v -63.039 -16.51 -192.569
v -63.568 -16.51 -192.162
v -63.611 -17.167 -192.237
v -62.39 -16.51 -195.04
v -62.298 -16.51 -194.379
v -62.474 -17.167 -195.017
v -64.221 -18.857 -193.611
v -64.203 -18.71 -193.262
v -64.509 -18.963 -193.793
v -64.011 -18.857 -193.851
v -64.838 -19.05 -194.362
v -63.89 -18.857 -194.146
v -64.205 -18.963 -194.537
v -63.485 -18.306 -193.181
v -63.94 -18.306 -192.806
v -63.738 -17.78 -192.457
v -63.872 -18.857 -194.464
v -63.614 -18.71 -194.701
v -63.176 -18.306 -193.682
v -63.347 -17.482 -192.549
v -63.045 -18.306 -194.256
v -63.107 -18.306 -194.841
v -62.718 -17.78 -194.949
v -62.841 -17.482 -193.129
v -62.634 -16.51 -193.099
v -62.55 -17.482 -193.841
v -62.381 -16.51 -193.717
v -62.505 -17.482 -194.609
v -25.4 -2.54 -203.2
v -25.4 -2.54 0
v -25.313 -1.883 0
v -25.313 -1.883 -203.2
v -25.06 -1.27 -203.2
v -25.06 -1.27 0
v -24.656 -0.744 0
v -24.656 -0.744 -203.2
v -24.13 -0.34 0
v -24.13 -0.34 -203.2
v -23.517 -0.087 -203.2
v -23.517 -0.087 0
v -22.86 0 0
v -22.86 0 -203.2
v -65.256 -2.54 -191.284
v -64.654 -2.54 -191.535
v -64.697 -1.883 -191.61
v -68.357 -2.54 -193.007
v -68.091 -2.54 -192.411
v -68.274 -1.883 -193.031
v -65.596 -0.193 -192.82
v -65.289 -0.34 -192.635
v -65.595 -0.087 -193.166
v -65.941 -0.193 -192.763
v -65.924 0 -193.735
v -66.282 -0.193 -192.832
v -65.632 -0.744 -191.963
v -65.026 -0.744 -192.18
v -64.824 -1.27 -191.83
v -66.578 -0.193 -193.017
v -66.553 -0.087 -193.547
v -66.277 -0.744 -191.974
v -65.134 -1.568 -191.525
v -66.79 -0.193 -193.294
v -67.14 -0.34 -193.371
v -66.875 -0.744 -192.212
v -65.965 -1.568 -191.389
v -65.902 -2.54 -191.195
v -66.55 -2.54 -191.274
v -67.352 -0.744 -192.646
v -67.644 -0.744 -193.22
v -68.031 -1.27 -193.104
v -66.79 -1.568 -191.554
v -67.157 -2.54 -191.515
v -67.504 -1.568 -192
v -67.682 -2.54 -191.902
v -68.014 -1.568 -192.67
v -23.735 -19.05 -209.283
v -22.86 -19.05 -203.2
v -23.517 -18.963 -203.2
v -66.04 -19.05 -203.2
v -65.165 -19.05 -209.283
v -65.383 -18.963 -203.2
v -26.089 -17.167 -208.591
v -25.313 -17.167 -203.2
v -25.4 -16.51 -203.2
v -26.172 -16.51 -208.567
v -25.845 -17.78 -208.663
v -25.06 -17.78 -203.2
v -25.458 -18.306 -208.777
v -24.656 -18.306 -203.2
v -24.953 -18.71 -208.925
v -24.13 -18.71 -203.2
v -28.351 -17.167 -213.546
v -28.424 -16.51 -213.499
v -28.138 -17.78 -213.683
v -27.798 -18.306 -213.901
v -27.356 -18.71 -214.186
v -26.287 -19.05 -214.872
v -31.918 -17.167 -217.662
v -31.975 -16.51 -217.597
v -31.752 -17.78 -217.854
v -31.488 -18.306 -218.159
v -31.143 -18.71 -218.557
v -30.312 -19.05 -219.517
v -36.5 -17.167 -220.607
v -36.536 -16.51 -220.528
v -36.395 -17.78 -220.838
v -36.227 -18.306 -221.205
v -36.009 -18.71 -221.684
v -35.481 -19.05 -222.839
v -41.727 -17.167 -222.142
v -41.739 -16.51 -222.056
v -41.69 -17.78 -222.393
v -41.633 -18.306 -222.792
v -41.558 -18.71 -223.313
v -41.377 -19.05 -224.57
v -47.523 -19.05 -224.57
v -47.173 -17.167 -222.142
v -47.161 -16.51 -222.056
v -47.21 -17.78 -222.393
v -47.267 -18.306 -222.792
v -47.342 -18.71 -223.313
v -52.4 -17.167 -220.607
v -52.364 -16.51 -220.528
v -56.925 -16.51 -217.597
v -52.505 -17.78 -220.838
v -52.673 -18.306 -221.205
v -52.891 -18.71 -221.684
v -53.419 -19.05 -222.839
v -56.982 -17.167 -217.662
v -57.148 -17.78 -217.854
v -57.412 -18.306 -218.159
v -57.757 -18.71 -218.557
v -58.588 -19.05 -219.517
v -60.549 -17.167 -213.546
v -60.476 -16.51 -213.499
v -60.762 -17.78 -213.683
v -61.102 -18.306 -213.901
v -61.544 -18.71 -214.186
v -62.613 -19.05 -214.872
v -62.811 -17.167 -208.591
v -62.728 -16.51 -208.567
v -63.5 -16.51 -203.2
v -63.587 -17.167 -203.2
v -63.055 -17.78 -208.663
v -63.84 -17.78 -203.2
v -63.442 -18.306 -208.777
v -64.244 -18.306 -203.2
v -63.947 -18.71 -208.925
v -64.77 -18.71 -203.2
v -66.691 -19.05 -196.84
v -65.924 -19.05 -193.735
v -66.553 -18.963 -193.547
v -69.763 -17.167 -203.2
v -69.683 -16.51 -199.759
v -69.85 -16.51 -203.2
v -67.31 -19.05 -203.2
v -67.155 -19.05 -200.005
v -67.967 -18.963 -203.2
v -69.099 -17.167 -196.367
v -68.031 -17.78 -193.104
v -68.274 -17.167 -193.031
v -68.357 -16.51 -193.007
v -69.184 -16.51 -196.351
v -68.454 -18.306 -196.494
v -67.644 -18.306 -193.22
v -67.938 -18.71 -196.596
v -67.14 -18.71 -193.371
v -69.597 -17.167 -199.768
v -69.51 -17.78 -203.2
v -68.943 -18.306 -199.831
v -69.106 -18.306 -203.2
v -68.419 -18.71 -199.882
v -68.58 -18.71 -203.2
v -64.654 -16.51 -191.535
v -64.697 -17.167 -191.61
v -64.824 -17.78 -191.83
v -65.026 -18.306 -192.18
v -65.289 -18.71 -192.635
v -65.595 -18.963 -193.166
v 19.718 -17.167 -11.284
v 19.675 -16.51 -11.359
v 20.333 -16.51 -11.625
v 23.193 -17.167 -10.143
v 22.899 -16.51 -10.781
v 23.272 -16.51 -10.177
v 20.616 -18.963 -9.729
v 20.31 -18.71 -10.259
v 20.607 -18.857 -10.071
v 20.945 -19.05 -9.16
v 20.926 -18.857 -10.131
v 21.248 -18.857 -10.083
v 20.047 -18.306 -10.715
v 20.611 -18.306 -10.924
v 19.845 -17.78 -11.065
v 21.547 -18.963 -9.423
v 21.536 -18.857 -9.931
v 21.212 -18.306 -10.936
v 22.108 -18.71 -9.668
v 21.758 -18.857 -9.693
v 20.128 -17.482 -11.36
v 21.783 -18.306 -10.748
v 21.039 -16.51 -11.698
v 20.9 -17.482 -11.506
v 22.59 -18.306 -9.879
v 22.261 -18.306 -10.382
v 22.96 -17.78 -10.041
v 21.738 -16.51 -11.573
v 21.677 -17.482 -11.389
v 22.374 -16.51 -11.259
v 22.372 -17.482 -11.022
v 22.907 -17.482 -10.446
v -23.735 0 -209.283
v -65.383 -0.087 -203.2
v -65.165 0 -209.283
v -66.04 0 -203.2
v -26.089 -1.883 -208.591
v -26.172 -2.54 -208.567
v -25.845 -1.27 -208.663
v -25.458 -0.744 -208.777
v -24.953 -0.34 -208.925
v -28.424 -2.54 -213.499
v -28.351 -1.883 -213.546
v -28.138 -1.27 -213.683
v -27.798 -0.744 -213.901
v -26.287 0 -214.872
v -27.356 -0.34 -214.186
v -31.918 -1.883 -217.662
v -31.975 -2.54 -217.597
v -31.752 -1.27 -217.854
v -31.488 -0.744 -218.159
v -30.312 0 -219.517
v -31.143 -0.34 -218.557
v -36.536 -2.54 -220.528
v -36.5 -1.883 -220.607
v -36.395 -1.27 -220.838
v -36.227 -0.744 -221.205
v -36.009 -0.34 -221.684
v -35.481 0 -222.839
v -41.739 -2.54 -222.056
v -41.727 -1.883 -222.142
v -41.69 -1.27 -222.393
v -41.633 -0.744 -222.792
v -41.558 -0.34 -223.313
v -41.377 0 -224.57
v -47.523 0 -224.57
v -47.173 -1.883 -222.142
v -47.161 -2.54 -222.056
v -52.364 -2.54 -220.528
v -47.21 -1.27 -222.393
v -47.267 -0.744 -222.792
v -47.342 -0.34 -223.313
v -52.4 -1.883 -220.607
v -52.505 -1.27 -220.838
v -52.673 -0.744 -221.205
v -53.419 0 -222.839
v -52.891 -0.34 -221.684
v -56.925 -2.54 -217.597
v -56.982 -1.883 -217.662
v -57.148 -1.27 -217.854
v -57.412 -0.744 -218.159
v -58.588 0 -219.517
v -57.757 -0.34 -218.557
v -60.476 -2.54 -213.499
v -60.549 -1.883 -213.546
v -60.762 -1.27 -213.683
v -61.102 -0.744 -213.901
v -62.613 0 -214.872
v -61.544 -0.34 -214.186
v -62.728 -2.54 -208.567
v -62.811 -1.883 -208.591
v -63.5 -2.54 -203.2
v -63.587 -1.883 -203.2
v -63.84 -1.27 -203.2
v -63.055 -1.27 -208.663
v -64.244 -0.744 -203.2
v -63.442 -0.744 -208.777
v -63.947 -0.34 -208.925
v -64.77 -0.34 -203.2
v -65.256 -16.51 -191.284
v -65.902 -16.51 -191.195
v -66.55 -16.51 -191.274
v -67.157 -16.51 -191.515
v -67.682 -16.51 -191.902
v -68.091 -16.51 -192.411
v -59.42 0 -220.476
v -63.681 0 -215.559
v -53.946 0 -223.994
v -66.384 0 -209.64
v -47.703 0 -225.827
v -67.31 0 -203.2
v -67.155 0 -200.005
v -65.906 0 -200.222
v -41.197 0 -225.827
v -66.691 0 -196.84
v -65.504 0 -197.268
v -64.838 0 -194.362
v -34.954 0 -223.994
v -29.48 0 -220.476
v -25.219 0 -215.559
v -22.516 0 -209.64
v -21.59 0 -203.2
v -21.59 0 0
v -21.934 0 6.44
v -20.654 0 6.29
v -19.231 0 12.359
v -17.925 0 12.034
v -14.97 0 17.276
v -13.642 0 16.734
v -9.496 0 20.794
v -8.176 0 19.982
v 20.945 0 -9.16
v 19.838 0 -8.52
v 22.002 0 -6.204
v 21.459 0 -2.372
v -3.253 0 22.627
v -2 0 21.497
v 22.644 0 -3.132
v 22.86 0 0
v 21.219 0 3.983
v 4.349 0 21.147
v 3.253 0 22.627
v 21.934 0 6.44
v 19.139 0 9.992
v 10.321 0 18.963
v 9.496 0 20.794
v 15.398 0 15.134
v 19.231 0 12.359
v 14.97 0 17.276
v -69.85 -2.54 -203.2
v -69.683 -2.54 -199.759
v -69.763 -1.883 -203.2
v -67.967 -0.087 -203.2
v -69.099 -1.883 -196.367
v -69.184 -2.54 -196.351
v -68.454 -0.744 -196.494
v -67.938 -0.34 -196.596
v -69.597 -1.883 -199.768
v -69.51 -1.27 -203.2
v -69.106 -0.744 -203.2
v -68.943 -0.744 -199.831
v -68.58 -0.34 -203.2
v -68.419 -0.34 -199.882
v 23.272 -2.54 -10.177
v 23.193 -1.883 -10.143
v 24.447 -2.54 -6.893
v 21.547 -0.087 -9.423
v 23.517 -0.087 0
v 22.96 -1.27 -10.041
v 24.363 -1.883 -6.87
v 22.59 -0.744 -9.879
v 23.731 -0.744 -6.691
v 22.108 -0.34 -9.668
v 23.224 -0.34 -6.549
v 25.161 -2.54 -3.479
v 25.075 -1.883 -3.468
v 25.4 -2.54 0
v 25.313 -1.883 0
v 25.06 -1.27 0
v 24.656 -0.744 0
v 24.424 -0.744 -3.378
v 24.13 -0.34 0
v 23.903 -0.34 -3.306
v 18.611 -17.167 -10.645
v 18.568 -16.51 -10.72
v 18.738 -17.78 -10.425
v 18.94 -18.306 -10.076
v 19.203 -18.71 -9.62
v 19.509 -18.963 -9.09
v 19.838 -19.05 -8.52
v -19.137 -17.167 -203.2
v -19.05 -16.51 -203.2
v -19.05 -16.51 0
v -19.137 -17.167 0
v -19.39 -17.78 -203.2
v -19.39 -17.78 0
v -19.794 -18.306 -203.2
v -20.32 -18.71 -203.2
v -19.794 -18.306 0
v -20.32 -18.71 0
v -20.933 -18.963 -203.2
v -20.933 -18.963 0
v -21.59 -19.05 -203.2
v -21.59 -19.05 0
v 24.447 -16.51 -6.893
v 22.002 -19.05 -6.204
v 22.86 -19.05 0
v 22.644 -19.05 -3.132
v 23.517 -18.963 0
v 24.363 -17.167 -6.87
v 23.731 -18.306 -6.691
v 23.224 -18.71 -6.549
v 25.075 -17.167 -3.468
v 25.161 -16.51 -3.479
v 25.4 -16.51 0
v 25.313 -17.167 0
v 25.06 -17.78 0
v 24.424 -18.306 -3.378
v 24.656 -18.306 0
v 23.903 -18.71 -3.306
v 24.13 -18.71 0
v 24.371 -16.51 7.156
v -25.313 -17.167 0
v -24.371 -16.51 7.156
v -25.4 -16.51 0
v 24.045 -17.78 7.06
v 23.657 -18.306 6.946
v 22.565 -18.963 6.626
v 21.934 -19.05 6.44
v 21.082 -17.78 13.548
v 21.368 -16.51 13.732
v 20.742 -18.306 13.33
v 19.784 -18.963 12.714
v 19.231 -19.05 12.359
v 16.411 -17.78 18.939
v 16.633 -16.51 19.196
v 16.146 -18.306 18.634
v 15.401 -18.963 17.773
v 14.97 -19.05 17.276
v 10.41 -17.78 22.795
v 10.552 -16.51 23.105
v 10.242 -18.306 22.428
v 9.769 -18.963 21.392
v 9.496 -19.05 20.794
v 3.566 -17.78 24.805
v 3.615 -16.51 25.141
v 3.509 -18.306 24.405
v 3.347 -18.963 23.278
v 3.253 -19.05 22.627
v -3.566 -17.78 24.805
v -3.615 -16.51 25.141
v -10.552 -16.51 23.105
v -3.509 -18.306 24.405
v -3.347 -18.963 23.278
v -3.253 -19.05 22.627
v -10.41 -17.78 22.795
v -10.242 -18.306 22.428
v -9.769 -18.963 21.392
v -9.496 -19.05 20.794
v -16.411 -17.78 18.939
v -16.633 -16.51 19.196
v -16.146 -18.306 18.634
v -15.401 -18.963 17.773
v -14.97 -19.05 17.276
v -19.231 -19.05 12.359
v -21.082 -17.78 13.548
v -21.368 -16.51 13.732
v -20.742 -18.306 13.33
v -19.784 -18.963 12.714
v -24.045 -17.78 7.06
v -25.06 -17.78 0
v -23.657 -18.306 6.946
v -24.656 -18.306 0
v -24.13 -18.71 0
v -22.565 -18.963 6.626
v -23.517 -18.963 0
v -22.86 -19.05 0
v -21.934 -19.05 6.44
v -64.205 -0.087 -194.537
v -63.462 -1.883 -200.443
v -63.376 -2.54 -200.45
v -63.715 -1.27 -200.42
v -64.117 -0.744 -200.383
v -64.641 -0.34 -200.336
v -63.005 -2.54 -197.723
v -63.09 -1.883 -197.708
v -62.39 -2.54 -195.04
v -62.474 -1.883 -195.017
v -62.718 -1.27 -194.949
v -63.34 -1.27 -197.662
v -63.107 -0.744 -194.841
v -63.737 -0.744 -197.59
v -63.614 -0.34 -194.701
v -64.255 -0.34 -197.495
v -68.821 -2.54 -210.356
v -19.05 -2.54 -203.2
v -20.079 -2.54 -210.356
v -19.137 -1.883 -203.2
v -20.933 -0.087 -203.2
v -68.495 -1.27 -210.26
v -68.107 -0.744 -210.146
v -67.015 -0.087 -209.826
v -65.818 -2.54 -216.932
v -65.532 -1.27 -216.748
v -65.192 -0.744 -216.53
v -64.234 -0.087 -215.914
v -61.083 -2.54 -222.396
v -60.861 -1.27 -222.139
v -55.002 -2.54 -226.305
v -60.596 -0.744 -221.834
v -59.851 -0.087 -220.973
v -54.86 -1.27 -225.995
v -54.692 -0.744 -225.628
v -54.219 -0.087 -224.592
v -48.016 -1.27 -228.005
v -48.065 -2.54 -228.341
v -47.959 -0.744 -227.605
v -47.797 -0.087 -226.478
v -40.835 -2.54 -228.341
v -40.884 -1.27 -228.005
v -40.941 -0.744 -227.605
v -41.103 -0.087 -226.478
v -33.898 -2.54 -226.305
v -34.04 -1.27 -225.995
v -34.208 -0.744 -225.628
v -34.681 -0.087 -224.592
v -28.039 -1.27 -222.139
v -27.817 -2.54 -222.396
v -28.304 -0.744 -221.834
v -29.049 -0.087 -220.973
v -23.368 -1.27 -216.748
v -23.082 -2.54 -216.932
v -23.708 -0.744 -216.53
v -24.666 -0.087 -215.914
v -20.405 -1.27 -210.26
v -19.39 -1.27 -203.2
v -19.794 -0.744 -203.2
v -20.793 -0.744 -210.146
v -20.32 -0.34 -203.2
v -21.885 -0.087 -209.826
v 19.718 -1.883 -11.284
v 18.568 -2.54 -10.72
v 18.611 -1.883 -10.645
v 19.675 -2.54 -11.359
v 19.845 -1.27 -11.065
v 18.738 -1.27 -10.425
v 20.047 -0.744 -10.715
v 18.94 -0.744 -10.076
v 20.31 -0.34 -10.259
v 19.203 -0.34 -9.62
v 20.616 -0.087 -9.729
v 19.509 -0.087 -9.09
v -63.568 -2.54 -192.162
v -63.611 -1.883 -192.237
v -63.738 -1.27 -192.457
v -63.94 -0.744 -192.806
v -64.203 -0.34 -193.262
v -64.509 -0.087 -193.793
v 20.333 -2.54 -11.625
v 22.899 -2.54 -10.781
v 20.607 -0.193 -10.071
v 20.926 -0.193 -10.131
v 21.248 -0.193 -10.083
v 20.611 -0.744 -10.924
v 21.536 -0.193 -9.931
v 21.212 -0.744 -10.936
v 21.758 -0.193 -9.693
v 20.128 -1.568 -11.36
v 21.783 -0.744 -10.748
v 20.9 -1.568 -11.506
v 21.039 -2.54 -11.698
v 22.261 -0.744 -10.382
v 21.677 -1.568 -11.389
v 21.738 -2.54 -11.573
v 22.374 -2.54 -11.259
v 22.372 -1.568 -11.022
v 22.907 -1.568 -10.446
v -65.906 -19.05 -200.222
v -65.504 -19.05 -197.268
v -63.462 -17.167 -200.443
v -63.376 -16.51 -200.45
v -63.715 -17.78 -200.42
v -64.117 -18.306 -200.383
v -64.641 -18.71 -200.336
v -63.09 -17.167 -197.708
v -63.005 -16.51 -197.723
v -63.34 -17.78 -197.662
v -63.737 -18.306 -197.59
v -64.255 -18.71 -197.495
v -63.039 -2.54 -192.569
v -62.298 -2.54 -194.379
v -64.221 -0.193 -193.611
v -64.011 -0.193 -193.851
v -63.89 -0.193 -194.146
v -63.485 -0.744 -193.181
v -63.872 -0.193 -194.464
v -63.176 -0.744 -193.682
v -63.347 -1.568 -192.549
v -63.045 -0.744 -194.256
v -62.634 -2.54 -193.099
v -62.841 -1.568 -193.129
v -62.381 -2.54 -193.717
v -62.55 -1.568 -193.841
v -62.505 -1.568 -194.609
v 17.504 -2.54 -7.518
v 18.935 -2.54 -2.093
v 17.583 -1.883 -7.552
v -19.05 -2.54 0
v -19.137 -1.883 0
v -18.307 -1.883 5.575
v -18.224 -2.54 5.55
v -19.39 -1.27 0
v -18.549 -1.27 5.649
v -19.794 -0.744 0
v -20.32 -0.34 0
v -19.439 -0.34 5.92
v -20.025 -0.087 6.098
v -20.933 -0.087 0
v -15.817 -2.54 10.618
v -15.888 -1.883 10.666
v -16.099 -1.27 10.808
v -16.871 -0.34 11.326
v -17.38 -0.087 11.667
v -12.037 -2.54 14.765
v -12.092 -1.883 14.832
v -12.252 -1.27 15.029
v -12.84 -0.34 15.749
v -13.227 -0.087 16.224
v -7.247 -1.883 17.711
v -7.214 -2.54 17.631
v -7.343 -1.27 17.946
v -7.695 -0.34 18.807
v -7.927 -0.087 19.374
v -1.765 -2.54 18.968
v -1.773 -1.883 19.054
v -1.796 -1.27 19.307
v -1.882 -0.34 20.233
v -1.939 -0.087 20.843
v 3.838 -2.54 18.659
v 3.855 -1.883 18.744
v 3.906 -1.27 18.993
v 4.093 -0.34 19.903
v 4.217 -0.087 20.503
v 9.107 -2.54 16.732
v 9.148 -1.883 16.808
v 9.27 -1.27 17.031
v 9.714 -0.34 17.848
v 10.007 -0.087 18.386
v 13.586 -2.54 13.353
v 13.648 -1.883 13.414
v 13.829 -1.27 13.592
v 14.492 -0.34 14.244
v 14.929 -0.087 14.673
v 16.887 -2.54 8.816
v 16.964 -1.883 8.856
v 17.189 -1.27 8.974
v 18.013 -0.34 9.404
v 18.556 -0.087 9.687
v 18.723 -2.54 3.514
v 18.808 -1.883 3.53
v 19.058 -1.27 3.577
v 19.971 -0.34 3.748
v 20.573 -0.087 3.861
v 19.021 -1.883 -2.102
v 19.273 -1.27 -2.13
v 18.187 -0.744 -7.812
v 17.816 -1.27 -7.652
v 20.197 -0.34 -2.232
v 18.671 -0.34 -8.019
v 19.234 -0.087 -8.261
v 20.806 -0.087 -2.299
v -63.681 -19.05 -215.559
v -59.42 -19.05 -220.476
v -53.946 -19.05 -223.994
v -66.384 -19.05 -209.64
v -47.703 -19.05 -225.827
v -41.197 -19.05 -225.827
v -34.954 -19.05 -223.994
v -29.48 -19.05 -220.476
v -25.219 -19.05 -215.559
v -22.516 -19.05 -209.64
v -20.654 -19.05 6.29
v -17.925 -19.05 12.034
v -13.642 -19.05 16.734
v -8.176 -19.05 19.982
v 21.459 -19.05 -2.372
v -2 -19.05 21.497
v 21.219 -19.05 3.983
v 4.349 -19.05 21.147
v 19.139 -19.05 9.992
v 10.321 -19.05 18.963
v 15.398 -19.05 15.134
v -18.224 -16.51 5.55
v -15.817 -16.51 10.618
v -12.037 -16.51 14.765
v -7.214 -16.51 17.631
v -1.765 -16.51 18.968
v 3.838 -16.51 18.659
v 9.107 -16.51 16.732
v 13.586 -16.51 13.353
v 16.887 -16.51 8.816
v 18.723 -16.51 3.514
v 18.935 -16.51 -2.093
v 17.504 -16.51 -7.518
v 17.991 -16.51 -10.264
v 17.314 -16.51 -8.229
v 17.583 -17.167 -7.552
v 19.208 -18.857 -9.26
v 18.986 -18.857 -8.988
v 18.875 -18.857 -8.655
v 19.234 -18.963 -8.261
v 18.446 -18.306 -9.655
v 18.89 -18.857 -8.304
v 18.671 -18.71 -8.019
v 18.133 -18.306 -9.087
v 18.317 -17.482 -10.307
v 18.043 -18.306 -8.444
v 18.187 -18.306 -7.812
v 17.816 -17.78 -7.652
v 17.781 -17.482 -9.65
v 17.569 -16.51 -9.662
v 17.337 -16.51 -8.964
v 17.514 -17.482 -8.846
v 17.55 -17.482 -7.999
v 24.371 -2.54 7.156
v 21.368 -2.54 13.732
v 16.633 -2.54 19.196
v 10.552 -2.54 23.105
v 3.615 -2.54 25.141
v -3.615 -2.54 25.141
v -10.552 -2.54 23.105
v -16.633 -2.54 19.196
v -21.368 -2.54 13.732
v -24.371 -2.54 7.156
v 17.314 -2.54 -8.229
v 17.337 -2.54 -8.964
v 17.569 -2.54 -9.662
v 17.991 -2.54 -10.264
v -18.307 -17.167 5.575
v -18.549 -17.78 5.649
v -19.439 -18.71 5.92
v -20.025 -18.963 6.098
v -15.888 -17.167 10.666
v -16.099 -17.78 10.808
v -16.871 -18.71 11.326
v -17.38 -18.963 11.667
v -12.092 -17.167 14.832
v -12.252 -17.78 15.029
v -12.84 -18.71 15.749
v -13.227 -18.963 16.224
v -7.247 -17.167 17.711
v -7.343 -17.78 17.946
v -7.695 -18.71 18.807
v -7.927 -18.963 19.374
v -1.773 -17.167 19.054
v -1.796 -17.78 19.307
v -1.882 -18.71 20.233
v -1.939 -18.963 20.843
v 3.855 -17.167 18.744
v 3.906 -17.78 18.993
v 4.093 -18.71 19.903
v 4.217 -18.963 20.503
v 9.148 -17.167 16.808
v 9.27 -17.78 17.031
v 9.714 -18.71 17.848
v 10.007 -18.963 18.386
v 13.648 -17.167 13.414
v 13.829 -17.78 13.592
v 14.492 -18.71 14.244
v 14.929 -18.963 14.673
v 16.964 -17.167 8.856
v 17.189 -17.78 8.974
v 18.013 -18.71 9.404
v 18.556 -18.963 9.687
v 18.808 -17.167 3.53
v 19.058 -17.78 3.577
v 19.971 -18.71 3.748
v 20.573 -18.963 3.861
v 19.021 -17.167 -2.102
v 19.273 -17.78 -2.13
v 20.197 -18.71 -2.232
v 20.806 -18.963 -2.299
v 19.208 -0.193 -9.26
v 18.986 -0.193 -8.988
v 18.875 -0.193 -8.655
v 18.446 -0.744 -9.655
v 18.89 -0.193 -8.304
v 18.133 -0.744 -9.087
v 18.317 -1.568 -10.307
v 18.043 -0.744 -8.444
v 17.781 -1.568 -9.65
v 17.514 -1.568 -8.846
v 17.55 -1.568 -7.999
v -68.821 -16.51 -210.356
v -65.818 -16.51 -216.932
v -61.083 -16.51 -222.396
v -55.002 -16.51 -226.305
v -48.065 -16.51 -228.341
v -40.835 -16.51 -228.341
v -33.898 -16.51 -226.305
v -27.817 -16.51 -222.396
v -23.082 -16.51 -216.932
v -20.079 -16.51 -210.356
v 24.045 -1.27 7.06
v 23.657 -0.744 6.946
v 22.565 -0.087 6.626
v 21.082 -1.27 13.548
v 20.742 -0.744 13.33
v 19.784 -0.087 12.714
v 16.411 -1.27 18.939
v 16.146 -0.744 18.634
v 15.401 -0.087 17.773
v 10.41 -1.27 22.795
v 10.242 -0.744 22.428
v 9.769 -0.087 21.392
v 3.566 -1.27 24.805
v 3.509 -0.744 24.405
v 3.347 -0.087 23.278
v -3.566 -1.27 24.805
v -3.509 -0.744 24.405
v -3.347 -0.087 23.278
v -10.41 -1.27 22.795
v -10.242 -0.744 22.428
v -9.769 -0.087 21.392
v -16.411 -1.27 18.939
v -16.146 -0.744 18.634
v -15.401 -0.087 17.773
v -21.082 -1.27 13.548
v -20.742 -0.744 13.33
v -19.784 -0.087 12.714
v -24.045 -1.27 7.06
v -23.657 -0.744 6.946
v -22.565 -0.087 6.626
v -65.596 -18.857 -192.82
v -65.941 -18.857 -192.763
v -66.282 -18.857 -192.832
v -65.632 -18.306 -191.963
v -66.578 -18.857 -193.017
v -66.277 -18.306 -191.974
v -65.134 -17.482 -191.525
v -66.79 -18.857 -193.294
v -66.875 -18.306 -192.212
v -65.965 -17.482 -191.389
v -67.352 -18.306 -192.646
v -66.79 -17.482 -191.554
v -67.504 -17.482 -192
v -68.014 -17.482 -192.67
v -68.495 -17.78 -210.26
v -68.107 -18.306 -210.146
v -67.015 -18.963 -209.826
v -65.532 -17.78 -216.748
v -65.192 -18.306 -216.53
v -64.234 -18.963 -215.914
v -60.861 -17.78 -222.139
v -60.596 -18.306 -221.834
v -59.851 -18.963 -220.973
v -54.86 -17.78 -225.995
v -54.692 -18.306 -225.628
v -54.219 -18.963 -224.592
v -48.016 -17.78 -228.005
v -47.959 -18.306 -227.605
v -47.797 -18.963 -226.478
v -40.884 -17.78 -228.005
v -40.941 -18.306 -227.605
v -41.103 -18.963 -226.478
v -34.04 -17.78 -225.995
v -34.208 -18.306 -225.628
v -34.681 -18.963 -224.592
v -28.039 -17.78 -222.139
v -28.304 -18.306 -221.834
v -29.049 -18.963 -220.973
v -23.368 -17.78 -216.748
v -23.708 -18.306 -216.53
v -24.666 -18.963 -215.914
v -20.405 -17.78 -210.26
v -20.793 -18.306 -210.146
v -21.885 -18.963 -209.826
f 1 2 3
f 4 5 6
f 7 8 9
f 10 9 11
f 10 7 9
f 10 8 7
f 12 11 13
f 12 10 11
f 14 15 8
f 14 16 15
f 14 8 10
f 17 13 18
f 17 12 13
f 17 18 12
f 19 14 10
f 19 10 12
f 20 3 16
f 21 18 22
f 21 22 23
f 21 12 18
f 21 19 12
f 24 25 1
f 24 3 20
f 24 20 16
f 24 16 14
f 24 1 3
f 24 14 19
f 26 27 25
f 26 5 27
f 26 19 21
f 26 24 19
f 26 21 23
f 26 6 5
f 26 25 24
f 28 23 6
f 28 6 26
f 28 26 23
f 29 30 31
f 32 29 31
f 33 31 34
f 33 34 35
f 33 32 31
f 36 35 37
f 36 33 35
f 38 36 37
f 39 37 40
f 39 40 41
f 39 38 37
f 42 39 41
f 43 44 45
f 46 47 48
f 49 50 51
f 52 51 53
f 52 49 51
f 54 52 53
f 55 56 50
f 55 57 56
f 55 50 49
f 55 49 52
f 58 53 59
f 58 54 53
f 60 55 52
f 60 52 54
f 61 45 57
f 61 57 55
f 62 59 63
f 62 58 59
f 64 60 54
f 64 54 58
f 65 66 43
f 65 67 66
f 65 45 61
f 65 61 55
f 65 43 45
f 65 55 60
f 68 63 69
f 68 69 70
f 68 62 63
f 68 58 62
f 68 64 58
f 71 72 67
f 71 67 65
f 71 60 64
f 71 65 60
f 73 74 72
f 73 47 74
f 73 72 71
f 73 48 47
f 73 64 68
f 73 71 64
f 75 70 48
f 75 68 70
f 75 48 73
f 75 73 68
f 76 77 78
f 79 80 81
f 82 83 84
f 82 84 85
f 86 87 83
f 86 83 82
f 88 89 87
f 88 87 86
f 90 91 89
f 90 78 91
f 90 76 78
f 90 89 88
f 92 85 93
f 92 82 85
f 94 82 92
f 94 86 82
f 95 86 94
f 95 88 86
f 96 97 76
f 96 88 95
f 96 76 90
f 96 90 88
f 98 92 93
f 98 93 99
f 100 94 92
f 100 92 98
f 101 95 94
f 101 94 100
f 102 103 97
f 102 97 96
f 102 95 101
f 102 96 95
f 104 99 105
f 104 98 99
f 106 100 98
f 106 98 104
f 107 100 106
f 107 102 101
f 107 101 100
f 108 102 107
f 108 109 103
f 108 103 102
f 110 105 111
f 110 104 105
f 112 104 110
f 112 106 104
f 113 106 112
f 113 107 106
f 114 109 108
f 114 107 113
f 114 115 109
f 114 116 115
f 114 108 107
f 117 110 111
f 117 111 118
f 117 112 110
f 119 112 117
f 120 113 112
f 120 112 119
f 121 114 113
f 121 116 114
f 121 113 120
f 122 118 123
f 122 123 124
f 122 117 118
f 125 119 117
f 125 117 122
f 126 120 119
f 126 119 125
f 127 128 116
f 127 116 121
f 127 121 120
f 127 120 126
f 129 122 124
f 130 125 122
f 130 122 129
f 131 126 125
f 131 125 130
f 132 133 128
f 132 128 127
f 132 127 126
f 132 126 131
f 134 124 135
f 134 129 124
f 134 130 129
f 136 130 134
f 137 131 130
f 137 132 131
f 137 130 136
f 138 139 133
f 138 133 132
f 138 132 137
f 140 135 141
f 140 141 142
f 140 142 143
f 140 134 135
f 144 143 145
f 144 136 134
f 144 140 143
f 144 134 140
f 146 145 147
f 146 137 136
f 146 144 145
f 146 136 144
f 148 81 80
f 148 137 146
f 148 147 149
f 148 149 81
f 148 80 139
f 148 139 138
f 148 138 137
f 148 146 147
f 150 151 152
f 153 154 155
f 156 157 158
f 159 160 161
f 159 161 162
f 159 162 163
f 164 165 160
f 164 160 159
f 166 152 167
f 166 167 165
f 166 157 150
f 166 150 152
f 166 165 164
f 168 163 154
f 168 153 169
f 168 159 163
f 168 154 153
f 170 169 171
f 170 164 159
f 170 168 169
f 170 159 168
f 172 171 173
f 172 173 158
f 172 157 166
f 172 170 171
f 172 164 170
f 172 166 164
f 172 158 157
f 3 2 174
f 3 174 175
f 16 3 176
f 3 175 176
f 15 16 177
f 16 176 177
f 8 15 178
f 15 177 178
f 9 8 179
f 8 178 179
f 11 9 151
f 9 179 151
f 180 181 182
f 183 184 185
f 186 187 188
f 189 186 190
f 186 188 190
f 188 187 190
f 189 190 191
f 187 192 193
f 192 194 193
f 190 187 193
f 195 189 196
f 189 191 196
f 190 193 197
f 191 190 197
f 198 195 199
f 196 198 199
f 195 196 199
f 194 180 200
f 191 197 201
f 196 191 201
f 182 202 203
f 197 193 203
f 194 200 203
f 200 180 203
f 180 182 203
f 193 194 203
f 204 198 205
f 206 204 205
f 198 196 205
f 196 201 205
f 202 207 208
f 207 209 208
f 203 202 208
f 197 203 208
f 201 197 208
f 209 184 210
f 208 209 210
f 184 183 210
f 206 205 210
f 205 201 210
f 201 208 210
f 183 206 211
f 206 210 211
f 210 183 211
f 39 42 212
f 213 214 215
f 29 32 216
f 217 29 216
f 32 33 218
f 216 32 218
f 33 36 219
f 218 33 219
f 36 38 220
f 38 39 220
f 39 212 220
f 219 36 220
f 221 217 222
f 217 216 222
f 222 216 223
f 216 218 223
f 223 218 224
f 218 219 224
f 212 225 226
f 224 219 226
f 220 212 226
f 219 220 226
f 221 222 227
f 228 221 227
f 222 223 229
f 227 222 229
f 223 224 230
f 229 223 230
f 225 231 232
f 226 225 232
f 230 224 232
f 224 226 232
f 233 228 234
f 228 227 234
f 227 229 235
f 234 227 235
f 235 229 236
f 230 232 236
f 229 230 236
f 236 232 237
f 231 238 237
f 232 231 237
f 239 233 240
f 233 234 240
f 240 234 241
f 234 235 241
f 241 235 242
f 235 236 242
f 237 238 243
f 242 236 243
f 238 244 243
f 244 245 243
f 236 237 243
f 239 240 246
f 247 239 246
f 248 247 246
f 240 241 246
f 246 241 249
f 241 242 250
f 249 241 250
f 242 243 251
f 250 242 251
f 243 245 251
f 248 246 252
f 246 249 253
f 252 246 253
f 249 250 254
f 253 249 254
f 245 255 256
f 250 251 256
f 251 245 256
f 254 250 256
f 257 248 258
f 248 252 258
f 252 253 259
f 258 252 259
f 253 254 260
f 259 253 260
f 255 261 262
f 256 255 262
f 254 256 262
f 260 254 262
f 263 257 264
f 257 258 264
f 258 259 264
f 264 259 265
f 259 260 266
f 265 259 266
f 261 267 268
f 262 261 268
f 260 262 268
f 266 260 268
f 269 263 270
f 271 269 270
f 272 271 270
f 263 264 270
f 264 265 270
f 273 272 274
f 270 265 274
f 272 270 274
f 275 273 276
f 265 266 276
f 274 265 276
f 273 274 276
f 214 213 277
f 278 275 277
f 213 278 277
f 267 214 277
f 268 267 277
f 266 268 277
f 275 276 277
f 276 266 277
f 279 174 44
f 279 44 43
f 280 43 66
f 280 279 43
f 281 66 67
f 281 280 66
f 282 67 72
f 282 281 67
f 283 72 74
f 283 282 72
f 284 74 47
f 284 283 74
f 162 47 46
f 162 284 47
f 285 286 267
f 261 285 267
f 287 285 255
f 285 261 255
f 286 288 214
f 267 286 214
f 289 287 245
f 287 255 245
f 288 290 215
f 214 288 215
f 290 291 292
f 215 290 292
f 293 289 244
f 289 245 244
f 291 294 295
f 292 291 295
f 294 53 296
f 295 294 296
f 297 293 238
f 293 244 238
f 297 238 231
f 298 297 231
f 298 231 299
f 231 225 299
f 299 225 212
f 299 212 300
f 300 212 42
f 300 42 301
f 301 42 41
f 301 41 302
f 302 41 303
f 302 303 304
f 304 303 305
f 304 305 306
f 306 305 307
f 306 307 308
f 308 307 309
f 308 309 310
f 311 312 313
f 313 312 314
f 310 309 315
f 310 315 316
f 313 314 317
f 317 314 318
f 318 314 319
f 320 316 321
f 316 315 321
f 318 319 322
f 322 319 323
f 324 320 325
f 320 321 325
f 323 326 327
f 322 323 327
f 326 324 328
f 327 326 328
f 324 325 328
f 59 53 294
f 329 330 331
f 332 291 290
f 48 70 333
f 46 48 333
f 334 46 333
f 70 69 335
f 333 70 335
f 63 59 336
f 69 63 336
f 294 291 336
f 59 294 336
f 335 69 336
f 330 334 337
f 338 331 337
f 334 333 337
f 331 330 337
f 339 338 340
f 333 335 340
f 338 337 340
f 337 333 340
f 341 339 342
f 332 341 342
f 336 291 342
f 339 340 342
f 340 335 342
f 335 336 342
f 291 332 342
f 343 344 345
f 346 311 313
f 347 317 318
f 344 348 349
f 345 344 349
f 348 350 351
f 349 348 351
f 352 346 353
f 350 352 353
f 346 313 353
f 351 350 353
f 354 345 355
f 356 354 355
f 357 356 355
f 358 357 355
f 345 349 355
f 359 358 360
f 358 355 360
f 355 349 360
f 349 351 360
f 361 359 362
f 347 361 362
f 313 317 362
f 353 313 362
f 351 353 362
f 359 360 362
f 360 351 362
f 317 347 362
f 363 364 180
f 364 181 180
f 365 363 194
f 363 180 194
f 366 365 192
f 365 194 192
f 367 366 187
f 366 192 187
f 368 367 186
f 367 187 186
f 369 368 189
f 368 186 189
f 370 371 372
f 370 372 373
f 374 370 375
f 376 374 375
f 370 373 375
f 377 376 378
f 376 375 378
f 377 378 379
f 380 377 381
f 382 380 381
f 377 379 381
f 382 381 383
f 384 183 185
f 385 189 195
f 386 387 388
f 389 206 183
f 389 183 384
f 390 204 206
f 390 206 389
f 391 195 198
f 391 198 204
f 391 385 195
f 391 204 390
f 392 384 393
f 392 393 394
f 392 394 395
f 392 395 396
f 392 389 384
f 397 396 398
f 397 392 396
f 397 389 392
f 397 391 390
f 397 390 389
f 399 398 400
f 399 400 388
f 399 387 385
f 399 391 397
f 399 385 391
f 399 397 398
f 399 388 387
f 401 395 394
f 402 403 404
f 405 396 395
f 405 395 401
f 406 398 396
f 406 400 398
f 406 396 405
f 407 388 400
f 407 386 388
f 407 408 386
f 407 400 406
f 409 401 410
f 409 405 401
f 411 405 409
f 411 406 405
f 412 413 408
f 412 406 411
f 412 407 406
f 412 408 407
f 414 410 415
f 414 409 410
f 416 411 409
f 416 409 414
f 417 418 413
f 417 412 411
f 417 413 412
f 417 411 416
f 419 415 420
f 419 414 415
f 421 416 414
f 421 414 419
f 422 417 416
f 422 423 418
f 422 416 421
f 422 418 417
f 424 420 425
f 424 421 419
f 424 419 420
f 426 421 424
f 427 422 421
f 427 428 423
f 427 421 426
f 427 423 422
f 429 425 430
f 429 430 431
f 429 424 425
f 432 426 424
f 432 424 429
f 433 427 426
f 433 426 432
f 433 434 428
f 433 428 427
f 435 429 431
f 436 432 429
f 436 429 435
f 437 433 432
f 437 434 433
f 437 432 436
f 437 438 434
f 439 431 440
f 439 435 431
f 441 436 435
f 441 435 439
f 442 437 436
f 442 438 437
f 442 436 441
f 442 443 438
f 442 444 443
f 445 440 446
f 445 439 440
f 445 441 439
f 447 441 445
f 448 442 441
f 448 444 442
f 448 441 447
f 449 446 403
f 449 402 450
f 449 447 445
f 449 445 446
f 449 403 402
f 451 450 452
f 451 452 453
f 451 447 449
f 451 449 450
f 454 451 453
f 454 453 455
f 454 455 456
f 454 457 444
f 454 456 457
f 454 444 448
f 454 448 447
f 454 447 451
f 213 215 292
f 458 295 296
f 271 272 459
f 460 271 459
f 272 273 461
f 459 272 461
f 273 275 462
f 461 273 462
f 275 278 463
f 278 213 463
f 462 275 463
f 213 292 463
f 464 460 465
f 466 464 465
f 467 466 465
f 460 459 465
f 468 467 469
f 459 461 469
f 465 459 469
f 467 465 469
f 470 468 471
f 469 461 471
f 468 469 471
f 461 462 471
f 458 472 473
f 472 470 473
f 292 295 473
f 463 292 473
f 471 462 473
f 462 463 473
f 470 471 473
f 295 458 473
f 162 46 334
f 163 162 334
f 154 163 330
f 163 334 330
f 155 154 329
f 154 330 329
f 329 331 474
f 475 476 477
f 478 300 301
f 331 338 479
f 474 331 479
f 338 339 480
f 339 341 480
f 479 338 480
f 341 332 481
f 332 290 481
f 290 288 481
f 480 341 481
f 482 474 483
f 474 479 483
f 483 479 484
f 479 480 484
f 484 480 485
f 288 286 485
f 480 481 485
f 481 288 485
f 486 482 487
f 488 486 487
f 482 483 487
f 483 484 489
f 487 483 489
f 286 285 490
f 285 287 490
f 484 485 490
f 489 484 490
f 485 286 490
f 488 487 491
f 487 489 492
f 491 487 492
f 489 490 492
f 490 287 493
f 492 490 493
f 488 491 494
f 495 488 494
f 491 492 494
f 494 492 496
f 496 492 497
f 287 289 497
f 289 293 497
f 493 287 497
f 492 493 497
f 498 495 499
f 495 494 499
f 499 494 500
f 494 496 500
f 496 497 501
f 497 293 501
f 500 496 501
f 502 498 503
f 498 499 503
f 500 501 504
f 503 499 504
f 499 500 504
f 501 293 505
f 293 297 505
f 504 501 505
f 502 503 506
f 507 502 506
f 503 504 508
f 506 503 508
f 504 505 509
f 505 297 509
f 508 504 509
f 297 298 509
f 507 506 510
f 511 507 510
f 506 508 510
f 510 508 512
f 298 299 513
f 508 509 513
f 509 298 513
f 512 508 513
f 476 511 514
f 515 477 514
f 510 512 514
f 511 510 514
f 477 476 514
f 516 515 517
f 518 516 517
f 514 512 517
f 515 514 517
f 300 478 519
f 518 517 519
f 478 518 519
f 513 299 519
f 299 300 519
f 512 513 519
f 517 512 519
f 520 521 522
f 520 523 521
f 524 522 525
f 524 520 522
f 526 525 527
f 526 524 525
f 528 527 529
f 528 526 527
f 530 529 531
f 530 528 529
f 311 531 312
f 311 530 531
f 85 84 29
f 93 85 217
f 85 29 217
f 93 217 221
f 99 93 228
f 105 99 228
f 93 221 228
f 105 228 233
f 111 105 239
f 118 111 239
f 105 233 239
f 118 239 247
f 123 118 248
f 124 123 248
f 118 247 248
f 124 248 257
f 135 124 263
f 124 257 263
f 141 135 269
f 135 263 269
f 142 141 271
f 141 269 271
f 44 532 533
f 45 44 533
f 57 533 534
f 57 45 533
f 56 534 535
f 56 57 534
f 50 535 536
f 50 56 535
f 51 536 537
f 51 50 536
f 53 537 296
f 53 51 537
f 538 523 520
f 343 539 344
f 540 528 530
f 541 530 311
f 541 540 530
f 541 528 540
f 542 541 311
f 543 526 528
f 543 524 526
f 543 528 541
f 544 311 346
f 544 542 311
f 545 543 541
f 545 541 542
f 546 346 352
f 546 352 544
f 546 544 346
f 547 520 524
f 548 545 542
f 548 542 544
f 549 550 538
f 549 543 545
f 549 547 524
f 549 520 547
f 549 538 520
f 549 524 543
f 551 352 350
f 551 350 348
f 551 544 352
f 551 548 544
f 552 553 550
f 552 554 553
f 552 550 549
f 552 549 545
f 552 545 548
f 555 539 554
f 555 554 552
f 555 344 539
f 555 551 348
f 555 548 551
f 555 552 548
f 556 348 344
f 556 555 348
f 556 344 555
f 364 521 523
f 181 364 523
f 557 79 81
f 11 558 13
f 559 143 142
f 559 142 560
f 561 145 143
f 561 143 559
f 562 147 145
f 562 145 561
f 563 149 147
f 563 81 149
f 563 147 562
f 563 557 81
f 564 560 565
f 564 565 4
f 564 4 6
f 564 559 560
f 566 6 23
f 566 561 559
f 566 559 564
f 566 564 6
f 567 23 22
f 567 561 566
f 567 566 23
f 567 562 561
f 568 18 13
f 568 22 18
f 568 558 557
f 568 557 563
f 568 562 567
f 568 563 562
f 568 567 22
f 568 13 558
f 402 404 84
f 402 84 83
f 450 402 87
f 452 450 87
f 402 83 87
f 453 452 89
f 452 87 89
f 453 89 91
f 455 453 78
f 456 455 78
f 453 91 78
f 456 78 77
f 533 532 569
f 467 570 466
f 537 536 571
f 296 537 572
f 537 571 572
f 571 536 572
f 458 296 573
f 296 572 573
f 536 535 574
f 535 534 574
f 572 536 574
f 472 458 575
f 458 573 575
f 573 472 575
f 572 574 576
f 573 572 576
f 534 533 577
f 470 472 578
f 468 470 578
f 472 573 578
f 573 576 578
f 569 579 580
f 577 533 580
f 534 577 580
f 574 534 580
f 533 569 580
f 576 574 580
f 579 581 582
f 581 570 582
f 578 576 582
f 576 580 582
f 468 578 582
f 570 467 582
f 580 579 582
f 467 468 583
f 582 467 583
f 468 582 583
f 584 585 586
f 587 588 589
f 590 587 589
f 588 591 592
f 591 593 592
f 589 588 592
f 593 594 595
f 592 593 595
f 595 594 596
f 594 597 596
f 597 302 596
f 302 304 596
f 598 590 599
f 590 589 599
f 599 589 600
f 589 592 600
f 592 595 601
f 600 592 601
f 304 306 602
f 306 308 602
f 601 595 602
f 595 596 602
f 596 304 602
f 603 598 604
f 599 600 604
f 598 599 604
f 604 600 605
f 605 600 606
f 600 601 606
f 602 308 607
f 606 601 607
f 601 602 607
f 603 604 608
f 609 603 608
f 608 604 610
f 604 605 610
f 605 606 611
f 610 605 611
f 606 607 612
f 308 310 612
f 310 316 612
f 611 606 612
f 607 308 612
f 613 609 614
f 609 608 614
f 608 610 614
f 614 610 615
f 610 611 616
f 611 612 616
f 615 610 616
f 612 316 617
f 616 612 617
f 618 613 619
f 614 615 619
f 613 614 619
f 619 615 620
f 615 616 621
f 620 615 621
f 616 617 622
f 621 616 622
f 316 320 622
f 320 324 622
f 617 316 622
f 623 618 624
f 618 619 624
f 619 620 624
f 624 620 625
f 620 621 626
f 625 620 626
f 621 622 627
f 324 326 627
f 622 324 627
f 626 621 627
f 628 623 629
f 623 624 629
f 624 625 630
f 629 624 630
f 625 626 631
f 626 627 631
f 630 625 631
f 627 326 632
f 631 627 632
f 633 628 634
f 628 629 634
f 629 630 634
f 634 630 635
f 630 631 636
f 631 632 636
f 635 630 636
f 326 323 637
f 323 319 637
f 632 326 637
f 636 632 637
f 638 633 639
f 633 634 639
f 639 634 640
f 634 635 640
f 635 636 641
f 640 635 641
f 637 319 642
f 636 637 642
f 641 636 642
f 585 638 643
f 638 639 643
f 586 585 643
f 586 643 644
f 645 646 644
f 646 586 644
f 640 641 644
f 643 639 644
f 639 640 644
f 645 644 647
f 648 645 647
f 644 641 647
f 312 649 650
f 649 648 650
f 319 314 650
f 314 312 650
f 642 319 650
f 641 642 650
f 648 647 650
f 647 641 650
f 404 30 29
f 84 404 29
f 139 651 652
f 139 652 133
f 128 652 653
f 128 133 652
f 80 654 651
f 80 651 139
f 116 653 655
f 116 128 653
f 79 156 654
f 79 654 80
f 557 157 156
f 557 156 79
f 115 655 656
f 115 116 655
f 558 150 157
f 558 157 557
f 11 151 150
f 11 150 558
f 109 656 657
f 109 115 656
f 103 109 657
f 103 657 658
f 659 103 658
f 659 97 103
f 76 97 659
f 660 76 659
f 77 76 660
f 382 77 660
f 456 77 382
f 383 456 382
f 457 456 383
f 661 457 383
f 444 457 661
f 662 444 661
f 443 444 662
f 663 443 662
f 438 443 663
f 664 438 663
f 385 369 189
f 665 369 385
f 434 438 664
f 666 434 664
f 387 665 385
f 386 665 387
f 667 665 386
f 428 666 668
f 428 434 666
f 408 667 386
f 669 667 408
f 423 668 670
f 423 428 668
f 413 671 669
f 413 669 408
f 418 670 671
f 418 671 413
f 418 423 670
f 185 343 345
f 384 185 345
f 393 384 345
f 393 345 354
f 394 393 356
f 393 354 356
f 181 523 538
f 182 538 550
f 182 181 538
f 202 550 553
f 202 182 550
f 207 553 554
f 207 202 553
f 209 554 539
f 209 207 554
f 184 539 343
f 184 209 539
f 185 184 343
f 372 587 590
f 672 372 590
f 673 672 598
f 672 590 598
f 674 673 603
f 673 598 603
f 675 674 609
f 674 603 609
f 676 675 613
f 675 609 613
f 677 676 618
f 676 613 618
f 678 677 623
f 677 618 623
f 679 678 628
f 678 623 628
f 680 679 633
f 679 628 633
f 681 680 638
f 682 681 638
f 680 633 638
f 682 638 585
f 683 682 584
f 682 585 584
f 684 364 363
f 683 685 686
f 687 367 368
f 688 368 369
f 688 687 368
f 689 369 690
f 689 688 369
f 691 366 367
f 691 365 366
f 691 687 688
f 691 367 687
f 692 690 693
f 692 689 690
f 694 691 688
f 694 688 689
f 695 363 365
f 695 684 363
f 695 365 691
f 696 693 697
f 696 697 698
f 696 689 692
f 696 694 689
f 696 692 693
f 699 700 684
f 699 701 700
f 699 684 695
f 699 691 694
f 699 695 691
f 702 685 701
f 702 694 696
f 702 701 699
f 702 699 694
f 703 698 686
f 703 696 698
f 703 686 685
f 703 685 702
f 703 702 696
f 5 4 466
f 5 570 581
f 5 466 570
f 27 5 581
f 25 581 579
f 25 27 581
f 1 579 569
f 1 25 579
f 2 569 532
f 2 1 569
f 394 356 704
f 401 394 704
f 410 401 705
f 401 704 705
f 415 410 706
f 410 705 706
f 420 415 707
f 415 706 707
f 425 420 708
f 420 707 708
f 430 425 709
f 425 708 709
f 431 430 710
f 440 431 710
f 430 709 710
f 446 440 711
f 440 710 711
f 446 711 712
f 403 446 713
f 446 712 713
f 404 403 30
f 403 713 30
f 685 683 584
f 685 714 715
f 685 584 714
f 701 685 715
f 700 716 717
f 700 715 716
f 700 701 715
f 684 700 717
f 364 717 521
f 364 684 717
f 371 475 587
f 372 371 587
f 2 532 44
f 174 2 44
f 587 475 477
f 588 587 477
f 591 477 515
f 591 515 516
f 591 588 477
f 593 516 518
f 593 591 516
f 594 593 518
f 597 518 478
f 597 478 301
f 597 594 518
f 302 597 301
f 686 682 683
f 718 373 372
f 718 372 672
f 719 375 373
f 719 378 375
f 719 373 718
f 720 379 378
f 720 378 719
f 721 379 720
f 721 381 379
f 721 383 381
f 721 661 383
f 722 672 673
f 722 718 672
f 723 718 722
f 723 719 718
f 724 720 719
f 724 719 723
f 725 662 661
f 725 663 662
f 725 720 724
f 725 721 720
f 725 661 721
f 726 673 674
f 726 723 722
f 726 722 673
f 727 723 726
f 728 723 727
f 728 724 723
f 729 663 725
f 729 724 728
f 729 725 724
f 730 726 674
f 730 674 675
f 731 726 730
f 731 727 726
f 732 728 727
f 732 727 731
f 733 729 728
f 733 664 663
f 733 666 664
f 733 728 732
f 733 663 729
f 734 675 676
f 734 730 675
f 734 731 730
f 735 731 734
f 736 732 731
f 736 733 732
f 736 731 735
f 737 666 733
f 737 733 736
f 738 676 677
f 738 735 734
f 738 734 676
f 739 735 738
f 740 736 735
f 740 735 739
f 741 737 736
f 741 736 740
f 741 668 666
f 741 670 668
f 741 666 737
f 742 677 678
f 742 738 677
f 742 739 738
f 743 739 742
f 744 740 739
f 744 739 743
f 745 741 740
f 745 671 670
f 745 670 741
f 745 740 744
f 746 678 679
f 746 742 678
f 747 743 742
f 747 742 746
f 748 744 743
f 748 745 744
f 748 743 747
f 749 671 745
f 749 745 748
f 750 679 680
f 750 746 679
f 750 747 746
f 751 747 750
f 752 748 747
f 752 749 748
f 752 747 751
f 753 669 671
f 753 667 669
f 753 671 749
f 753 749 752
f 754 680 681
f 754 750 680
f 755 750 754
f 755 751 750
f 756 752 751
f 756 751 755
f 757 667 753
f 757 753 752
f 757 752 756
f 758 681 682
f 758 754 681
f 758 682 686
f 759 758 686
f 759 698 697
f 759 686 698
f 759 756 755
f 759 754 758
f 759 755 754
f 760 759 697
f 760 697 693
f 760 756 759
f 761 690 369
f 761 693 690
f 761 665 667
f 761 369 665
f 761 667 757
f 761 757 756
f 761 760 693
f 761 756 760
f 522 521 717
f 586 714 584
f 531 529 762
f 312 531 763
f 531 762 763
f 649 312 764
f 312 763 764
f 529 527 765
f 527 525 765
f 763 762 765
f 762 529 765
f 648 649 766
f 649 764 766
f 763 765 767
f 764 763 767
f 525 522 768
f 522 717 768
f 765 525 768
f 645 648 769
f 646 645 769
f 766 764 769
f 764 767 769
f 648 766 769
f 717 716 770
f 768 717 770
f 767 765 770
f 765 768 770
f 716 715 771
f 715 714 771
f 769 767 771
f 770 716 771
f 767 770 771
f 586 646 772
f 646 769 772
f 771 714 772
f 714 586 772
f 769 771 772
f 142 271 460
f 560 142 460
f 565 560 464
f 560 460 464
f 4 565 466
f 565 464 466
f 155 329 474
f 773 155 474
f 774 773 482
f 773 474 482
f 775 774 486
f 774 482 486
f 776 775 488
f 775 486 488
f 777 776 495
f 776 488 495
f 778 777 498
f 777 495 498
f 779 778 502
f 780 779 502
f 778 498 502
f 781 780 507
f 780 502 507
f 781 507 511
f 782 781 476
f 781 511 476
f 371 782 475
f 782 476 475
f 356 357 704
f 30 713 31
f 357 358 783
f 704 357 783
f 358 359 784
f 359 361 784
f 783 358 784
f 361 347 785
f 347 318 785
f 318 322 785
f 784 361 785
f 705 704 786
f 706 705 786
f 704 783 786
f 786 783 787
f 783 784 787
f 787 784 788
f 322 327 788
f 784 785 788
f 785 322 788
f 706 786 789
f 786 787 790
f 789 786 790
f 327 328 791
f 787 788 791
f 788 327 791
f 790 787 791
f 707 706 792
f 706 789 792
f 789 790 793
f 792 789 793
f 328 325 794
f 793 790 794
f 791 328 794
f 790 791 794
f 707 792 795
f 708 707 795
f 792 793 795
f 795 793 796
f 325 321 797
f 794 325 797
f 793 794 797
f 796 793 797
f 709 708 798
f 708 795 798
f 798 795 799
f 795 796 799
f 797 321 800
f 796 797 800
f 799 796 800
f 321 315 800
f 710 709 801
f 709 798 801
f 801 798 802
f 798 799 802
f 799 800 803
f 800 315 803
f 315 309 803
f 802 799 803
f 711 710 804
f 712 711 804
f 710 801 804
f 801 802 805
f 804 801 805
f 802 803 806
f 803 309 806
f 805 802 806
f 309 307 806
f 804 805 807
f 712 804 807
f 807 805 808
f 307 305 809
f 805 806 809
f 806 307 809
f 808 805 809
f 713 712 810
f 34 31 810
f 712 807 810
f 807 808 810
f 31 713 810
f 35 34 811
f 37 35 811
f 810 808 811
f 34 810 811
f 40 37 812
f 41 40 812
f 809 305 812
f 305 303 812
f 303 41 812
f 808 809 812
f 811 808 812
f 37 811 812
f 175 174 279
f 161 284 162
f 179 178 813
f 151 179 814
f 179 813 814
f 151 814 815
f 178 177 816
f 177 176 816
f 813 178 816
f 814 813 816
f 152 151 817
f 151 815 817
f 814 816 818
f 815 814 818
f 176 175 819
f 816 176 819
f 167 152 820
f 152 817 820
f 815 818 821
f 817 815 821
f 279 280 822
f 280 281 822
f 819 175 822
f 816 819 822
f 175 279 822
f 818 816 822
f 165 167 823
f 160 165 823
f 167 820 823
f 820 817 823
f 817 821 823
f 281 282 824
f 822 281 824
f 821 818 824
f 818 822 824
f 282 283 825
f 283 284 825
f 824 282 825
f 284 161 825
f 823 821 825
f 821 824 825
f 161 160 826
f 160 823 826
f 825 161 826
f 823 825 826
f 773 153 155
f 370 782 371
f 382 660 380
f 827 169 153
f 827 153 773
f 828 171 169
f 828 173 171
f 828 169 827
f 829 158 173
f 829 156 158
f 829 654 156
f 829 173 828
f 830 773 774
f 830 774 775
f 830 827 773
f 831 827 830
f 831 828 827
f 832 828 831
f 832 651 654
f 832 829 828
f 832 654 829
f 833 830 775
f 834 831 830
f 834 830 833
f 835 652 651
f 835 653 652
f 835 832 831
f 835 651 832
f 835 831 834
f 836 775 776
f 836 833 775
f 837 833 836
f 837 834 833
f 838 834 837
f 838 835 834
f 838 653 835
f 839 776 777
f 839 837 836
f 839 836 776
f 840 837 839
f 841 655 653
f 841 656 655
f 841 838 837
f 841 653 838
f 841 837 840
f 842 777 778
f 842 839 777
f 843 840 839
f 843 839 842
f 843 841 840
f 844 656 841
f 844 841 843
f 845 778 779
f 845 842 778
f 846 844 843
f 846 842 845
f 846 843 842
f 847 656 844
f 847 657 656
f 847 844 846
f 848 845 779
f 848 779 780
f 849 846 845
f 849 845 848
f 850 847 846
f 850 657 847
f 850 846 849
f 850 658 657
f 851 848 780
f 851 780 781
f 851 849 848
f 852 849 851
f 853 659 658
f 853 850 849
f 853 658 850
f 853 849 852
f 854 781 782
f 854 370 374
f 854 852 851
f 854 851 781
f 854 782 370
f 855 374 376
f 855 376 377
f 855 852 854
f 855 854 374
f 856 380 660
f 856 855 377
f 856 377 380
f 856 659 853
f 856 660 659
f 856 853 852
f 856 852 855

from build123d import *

# Parameters (mm, degrees)
F1_DEPTH = 19.05
F2_R     = 2.54


# Not quite as in the source:
# - a feature names something its author has since deleted; it is built from what else it names


with BuildPart() as f1:
    # F0 (on Front) → F1 (new body)
    with BuildSketch(Plane.XZ):
        with BuildLine():
            ThreePointArc((25.4, 0), (0, 25.4), (-25.4, 0))
            Line((-25.4, 0), (-25.4, -203.2))
            ThreePointArc((-25.4, -203.2), (-44.45, -222.25), (-63.5, -203.2))
            ThreePointArc((-63.5, -203.2), (-63.0744281022, -198.1179462529), (-61.8095664242, -193.177449652))
            Line((-61.8095664242, -193.177449652), (-67.3088277382, -190.002449652))
            ThreePointArc((-67.3088277382, -190.002449652), (-69.208925247, -196.4800131761), (-69.85, -203.2))
            ThreePointArc((-69.85, -203.2), (-44.45, -228.6), (-19.05, -203.2))
            Line((-19.05, -203.2), (-19.05, 0))
            ThreePointArc((-19.05, 0), (4.9305028092, 18.4008869908), (16.4977839421, -9.525))
            Line((16.4977839421, -9.525), (21.9970452561, -12.7))
            ThreePointArc((21.9970452561, -12.7), (24.5345159877, -6.5740037456), (25.4, 0))
        make_face()
    extrude(amount=F1_DEPTH)

    # F2
    f2_edges = [f1.edges().sort_by_distance(p)[0] for p in [
        (-61.809566, -9.525, -193.17745),
        (-67.308828, -9.525, -190.00245),
        (-64.559197, 0, -191.58995),
        (-64.559197, -19.05, -191.58995),
        (16.497784, -9.525, -9.525),
        (21.997045, -9.525, -12.7),
        (19.247415, 0, -11.1125),
        (19.247415, -19.05, -11.1125),
        (-19.05, 0, -101.6),
        (4.930503, 0, 18.400887),
        (6.574004, 0, 24.534516),
        (-25.4, 0, -101.6),
        (-44.45, 0, -222.25),
        (-63.074428, 0, -198.117946),
        (-69.208925, 0, -196.480013),
        (-44.45, 0, -228.6),
        (-19.05, -19.05, -101.6),
        (4.930503, -19.05, 18.400887),
        (6.574004, -19.05, 24.534516),
        (-25.4, -19.05, -101.6),
        (-44.45, -19.05, -222.25),
        (-63.074428, -19.05, -198.117946),
        (-69.208925, -19.05, -196.480013),
        (-44.45, -19.05, -228.6),
    ]]
    fillet(f2_edges, radius=F2_R)


solid = f1.part
